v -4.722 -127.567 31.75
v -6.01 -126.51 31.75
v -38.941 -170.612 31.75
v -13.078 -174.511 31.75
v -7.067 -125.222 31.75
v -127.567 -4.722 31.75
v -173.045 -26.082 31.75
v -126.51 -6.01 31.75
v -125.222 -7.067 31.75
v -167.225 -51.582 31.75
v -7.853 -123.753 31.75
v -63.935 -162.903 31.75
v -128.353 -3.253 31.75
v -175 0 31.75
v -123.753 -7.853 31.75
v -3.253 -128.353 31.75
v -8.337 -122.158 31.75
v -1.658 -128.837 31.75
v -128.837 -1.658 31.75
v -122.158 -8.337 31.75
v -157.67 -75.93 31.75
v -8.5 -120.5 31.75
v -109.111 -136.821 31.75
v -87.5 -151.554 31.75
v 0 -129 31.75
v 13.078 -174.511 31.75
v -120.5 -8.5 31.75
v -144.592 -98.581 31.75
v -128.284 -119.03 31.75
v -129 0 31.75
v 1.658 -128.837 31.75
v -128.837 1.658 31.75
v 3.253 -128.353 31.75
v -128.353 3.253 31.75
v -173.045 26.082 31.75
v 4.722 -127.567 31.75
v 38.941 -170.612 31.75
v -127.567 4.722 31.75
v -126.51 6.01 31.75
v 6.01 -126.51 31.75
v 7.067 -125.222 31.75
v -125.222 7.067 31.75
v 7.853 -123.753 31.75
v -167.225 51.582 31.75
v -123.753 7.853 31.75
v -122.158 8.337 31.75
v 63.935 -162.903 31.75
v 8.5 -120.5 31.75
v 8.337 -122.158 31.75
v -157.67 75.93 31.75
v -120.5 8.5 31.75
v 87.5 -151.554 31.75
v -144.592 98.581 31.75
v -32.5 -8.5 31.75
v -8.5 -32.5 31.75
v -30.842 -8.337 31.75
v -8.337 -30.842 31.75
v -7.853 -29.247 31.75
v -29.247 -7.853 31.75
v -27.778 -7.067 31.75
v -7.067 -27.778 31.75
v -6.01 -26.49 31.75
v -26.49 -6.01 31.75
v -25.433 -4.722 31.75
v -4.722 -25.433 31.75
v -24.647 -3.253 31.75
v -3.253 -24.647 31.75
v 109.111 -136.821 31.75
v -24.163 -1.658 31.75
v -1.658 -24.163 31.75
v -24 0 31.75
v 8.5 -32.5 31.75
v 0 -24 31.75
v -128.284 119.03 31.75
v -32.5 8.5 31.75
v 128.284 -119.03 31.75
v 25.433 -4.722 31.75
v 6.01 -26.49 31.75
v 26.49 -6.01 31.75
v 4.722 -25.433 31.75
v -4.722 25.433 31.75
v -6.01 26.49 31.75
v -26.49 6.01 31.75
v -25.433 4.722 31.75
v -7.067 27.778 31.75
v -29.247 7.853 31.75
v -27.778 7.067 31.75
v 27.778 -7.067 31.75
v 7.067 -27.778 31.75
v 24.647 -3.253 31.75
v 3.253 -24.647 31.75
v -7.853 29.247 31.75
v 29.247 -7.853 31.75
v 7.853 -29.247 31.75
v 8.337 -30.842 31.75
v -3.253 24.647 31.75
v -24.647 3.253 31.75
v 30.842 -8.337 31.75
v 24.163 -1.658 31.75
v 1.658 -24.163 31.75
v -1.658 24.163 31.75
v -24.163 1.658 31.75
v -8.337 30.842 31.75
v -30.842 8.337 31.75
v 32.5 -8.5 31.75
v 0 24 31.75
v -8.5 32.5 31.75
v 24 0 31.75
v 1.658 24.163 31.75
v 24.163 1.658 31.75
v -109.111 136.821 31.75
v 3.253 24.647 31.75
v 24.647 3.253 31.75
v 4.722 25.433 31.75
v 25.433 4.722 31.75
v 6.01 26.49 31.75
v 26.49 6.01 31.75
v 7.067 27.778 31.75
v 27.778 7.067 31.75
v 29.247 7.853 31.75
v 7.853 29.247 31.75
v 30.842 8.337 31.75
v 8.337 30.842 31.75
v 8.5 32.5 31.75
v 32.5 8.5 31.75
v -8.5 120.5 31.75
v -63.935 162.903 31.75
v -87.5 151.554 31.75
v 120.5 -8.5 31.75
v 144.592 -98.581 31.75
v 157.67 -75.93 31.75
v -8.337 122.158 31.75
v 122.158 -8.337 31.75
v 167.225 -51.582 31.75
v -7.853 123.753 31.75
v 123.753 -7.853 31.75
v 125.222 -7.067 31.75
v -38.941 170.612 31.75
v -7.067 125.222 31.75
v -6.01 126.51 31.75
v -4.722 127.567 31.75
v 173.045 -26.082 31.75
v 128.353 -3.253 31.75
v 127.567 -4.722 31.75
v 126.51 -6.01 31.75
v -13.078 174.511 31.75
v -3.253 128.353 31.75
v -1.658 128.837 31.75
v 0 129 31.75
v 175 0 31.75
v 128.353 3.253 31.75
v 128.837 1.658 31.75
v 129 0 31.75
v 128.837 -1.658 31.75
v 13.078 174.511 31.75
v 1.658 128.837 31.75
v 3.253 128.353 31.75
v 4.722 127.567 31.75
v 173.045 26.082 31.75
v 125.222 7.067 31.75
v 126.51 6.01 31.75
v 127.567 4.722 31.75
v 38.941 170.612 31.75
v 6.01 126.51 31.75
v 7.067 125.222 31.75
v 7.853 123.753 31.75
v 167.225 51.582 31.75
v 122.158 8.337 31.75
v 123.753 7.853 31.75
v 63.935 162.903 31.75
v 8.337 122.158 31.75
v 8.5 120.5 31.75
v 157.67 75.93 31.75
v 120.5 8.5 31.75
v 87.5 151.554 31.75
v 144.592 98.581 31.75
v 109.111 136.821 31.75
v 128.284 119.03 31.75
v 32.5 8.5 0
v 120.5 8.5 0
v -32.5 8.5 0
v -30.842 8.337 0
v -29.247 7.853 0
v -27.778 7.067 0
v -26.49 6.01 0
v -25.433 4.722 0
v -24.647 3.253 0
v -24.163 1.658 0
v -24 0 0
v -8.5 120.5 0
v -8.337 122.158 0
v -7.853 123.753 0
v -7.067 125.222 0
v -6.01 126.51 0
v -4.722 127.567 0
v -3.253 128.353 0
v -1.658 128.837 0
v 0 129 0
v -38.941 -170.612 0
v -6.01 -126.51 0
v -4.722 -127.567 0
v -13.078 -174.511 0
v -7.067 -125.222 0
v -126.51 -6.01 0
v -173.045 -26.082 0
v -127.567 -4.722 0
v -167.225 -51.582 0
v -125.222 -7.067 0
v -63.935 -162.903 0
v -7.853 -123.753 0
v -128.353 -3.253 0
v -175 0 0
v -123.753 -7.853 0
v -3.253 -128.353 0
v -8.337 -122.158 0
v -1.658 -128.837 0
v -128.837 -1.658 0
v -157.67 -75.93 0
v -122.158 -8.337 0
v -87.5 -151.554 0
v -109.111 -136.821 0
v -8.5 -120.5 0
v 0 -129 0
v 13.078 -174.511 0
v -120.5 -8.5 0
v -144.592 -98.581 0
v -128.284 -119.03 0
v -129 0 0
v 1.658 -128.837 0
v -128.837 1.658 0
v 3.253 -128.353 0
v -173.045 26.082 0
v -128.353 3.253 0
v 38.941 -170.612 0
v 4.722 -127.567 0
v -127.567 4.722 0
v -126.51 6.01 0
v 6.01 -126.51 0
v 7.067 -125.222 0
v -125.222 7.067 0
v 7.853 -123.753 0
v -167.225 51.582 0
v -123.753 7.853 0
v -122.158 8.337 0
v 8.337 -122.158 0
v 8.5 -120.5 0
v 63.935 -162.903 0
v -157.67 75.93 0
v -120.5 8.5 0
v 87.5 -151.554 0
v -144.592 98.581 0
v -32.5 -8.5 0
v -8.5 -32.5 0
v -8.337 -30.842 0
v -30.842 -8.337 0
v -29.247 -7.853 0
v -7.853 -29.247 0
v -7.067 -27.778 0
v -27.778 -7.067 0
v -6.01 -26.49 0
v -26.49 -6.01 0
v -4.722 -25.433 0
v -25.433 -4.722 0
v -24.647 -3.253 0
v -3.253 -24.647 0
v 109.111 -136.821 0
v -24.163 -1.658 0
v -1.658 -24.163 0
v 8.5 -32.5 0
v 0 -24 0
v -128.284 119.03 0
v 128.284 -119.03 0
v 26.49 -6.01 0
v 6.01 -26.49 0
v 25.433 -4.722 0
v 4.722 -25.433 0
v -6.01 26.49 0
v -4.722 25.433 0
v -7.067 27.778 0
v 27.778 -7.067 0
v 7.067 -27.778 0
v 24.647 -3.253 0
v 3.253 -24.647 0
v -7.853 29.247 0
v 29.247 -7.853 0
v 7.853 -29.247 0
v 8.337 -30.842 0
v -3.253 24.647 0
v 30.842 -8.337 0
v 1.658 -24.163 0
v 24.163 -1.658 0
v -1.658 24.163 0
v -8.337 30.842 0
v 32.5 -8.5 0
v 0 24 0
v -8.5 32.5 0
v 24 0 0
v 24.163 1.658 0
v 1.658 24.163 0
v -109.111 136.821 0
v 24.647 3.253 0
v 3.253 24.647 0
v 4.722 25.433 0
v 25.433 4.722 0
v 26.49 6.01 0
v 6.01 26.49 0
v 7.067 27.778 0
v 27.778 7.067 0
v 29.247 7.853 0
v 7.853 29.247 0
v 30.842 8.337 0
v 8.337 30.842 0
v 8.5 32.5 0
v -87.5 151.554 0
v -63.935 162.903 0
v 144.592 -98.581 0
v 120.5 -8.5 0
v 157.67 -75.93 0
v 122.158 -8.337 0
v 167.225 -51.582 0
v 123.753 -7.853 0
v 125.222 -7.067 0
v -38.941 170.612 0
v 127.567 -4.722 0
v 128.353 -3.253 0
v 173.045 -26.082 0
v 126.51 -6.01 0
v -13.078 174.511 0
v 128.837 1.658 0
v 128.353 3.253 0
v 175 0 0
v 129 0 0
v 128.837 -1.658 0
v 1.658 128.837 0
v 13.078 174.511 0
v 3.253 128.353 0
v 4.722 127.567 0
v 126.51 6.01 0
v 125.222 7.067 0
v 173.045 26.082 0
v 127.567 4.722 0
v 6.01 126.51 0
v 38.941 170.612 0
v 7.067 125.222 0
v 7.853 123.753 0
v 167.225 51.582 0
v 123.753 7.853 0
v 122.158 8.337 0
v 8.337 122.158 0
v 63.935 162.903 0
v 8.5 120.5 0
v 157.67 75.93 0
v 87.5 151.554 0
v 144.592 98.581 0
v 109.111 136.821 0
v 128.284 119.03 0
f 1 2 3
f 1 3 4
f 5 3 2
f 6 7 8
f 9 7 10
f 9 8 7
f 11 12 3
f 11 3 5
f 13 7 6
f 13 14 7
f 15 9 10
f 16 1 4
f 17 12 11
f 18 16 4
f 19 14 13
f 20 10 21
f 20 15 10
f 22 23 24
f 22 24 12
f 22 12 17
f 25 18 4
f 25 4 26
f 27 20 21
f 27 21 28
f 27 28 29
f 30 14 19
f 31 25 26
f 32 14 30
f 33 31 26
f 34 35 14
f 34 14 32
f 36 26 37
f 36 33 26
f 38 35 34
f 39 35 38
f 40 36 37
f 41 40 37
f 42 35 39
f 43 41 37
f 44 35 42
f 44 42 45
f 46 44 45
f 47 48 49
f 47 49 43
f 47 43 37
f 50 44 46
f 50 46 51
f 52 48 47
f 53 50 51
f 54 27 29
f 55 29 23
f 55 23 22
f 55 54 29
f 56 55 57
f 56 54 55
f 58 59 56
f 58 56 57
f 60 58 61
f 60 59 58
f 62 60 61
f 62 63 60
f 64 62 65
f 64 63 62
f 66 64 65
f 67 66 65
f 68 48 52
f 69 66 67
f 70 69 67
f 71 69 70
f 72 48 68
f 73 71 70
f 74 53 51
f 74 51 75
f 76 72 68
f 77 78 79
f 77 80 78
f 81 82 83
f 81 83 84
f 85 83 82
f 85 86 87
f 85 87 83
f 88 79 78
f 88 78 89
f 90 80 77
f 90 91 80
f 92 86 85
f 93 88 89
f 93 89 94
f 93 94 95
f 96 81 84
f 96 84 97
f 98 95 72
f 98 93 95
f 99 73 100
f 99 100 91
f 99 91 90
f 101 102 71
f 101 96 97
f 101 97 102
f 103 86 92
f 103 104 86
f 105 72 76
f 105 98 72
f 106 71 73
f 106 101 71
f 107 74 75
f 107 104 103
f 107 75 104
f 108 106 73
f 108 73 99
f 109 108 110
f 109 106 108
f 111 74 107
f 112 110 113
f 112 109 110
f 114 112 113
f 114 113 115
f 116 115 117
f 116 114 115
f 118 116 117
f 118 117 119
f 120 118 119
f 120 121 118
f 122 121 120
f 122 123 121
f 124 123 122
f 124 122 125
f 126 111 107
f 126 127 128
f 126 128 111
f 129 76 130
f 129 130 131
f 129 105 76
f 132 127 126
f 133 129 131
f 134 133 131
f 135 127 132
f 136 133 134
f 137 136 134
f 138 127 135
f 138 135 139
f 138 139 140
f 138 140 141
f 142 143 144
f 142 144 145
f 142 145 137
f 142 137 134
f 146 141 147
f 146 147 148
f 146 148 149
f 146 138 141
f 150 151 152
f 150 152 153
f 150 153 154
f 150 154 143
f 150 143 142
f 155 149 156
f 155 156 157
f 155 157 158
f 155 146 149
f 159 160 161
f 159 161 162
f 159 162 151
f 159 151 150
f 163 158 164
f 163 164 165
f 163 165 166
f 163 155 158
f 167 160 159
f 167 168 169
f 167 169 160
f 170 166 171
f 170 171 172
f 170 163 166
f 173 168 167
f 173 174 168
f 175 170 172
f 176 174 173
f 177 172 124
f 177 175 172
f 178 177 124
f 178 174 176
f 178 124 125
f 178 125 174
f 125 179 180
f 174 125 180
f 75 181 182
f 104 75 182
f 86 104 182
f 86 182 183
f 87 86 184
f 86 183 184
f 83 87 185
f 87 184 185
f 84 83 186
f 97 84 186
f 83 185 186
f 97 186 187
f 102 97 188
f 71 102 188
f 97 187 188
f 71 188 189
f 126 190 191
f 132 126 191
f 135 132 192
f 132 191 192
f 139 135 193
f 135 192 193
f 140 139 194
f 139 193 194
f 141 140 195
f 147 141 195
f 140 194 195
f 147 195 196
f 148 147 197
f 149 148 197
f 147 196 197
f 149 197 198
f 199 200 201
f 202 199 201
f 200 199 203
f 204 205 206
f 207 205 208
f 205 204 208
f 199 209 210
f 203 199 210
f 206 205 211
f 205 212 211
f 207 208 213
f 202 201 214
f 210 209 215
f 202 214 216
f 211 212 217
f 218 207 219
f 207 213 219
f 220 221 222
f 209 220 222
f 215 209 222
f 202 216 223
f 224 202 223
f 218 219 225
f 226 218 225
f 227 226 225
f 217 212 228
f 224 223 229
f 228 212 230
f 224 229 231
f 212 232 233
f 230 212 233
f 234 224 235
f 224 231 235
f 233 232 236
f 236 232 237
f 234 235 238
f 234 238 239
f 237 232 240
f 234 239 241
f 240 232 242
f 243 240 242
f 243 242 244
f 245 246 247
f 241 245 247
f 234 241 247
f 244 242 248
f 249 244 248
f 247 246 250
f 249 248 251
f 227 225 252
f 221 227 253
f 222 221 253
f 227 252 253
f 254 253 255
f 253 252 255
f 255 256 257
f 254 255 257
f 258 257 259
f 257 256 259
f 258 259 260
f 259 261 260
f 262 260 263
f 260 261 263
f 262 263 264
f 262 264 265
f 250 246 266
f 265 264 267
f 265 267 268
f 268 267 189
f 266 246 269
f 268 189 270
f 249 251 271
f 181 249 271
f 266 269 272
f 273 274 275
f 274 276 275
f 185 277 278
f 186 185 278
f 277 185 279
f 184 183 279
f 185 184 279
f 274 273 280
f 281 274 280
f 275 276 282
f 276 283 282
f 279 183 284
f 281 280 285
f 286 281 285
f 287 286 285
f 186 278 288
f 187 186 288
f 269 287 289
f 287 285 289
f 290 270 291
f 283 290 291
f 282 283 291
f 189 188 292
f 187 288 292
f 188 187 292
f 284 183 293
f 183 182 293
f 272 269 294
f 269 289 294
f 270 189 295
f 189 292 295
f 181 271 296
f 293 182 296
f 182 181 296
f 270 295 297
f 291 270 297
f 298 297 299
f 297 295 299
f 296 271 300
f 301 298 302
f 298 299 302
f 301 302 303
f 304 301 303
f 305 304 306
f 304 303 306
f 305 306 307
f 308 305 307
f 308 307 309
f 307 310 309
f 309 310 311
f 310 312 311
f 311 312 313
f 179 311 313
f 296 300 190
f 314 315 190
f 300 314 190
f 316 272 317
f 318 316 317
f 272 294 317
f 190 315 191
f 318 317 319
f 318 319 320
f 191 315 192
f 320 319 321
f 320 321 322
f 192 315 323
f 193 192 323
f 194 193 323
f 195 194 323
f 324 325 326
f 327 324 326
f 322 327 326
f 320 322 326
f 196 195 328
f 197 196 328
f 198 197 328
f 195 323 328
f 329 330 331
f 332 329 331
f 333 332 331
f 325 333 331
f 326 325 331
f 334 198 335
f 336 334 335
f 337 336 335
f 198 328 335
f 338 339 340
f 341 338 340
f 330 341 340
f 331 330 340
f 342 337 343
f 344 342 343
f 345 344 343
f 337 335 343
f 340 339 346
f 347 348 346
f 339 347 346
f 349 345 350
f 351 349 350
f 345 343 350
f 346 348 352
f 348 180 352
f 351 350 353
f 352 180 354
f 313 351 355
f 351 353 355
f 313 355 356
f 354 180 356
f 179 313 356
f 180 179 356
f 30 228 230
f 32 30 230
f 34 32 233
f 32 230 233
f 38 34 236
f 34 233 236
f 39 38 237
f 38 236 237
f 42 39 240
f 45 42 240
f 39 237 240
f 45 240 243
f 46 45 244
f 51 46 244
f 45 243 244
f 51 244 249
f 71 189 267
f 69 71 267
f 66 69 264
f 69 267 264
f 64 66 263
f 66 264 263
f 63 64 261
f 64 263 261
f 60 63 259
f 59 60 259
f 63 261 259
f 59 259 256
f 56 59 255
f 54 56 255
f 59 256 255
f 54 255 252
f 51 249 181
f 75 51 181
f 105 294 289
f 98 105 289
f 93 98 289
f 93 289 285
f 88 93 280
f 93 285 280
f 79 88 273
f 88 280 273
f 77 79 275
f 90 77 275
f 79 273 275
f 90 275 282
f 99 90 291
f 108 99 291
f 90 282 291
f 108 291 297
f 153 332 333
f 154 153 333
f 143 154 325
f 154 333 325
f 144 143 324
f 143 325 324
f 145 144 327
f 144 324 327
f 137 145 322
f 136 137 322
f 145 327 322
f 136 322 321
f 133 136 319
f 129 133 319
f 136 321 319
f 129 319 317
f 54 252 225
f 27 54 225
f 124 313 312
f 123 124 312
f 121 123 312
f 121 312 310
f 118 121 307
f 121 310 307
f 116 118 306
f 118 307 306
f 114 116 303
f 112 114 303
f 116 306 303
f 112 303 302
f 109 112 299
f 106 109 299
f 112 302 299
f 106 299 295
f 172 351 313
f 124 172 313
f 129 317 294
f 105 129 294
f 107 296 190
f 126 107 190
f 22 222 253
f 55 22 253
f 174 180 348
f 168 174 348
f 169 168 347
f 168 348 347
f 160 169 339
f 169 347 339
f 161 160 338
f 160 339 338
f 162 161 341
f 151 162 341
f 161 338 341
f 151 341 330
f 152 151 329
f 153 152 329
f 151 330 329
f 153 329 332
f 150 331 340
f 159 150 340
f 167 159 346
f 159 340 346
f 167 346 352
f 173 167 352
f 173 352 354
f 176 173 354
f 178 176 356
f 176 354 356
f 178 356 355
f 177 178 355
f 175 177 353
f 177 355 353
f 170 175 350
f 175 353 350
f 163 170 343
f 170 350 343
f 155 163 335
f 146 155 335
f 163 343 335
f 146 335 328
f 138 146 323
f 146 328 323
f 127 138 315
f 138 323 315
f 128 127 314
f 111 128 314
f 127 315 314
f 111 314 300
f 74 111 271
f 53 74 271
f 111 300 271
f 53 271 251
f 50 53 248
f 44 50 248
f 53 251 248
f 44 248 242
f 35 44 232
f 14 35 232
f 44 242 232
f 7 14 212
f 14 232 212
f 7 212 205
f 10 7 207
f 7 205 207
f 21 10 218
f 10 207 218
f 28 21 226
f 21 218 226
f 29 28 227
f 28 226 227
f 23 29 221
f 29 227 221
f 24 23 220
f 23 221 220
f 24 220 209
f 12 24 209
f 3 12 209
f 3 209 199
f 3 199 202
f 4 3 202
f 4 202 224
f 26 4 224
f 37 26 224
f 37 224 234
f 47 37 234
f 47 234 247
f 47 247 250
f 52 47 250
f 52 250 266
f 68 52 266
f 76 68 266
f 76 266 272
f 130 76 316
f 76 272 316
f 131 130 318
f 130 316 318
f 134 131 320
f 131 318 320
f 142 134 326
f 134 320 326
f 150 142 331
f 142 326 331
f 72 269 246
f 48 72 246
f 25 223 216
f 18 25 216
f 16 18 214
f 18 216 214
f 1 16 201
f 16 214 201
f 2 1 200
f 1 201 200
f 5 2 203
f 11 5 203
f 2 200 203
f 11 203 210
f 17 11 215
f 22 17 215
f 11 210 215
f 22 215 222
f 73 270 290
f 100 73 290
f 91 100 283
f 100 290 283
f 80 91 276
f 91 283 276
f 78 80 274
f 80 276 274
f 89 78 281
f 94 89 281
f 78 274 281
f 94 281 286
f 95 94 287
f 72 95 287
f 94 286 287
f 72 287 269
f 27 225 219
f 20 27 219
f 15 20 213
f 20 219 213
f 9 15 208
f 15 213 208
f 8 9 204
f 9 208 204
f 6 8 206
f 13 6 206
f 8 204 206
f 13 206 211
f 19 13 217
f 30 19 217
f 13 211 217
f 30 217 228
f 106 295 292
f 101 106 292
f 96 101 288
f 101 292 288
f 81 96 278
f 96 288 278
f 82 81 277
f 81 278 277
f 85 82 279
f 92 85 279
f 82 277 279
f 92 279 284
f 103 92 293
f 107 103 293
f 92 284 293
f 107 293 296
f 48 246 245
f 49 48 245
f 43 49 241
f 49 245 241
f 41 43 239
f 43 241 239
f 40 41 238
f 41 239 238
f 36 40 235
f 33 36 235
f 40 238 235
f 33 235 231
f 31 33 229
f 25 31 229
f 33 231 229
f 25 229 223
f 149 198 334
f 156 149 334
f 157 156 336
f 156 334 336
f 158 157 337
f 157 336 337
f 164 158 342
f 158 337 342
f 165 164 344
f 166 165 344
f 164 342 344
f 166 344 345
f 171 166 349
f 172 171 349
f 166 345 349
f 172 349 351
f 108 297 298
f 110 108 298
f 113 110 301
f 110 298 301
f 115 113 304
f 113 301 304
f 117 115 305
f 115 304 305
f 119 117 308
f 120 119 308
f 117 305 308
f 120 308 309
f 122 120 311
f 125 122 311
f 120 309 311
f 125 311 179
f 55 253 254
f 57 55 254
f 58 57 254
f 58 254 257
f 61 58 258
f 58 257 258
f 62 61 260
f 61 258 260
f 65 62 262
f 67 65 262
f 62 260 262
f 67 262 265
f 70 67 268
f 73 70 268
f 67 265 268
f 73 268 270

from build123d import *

# Parameters (mm, degrees)
F0_R     = 175
F1_DEPTH = 31.75


with BuildPart() as f1:
    # F0 (on Top) → F1 (new body)
    with BuildSketch(Plane.XY):
        Circle(F0_R)
        with BuildLine():
            ThreePointArc((0, -129), (-6.010408, -126.510408), (-8.5, -120.5))
            Line((-8.5, -120.5), (-8.5, -32.5))
            ThreePointArc((-8.5, -32.5), (-6.010408, -26.489592), (0, -24))
            ThreePointArc((0, -24), (6.010408, -26.489592), (8.5, -32.5))
            Line((8.5, -32.5), (8.5, -120.5))
            ThreePointArc((8.5, -120.5), (6.010408, -126.510408), (0, -129))
        make_face(mode=Mode.SUBTRACT)
        with BuildLine():
            ThreePointArc((-129, 0), (-126.510408, 6.010408), (-120.5, 8.5))
            Line((-120.5, 8.5), (-32.5, 8.5))
            ThreePointArc((-32.5, 8.5), (-26.489592, 6.010408), (-24, 0))
            ThreePointArc((-24, 0), (-26.489592, -6.010408), (-32.5, -8.5))
            Line((-32.5, -8.5), (-120.5, -8.5))
            ThreePointArc((-120.5, -8.5), (-126.510408, -6.010408), (-129, 0))
        make_face(mode=Mode.SUBTRACT)
        with BuildLine():
            ThreePointArc((129, 0), (126.510408, -6.010408), (120.5, -8.5))
            Line((120.5, -8.5), (32.5, -8.5))
            ThreePointArc((32.5, -8.5), (26.489592, -6.010408), (24, 0))
            ThreePointArc((24, 0), (26.489592, 6.010408), (32.5, 8.5))
            Line((32.5, 8.5), (120.5, 8.5))
            ThreePointArc((120.5, 8.5), (126.510408, 6.010408), (129, 0))
        make_face(mode=Mode.SUBTRACT)
        with BuildLine():
            Line((-8.5, 32.5), (-8.5, 120.5))
            ThreePointArc((-8.5, 120.5), (-6.010408, 126.510408), (0, 129))
            ThreePointArc((0, 129), (6.010408, 126.510408), (8.5, 120.5))
            Line((8.5, 120.5), (8.5, 32.5))
            ThreePointArc((8.5, 32.5), (6.010408, 26.489592), (0, 24))
            ThreePointArc((0, 24), (-6.010408, 26.489592), (-8.5, 32.5))
        make_face(mode=Mode.SUBTRACT)
    extrude(amount=F1_DEPTH)


solid = f1.part
